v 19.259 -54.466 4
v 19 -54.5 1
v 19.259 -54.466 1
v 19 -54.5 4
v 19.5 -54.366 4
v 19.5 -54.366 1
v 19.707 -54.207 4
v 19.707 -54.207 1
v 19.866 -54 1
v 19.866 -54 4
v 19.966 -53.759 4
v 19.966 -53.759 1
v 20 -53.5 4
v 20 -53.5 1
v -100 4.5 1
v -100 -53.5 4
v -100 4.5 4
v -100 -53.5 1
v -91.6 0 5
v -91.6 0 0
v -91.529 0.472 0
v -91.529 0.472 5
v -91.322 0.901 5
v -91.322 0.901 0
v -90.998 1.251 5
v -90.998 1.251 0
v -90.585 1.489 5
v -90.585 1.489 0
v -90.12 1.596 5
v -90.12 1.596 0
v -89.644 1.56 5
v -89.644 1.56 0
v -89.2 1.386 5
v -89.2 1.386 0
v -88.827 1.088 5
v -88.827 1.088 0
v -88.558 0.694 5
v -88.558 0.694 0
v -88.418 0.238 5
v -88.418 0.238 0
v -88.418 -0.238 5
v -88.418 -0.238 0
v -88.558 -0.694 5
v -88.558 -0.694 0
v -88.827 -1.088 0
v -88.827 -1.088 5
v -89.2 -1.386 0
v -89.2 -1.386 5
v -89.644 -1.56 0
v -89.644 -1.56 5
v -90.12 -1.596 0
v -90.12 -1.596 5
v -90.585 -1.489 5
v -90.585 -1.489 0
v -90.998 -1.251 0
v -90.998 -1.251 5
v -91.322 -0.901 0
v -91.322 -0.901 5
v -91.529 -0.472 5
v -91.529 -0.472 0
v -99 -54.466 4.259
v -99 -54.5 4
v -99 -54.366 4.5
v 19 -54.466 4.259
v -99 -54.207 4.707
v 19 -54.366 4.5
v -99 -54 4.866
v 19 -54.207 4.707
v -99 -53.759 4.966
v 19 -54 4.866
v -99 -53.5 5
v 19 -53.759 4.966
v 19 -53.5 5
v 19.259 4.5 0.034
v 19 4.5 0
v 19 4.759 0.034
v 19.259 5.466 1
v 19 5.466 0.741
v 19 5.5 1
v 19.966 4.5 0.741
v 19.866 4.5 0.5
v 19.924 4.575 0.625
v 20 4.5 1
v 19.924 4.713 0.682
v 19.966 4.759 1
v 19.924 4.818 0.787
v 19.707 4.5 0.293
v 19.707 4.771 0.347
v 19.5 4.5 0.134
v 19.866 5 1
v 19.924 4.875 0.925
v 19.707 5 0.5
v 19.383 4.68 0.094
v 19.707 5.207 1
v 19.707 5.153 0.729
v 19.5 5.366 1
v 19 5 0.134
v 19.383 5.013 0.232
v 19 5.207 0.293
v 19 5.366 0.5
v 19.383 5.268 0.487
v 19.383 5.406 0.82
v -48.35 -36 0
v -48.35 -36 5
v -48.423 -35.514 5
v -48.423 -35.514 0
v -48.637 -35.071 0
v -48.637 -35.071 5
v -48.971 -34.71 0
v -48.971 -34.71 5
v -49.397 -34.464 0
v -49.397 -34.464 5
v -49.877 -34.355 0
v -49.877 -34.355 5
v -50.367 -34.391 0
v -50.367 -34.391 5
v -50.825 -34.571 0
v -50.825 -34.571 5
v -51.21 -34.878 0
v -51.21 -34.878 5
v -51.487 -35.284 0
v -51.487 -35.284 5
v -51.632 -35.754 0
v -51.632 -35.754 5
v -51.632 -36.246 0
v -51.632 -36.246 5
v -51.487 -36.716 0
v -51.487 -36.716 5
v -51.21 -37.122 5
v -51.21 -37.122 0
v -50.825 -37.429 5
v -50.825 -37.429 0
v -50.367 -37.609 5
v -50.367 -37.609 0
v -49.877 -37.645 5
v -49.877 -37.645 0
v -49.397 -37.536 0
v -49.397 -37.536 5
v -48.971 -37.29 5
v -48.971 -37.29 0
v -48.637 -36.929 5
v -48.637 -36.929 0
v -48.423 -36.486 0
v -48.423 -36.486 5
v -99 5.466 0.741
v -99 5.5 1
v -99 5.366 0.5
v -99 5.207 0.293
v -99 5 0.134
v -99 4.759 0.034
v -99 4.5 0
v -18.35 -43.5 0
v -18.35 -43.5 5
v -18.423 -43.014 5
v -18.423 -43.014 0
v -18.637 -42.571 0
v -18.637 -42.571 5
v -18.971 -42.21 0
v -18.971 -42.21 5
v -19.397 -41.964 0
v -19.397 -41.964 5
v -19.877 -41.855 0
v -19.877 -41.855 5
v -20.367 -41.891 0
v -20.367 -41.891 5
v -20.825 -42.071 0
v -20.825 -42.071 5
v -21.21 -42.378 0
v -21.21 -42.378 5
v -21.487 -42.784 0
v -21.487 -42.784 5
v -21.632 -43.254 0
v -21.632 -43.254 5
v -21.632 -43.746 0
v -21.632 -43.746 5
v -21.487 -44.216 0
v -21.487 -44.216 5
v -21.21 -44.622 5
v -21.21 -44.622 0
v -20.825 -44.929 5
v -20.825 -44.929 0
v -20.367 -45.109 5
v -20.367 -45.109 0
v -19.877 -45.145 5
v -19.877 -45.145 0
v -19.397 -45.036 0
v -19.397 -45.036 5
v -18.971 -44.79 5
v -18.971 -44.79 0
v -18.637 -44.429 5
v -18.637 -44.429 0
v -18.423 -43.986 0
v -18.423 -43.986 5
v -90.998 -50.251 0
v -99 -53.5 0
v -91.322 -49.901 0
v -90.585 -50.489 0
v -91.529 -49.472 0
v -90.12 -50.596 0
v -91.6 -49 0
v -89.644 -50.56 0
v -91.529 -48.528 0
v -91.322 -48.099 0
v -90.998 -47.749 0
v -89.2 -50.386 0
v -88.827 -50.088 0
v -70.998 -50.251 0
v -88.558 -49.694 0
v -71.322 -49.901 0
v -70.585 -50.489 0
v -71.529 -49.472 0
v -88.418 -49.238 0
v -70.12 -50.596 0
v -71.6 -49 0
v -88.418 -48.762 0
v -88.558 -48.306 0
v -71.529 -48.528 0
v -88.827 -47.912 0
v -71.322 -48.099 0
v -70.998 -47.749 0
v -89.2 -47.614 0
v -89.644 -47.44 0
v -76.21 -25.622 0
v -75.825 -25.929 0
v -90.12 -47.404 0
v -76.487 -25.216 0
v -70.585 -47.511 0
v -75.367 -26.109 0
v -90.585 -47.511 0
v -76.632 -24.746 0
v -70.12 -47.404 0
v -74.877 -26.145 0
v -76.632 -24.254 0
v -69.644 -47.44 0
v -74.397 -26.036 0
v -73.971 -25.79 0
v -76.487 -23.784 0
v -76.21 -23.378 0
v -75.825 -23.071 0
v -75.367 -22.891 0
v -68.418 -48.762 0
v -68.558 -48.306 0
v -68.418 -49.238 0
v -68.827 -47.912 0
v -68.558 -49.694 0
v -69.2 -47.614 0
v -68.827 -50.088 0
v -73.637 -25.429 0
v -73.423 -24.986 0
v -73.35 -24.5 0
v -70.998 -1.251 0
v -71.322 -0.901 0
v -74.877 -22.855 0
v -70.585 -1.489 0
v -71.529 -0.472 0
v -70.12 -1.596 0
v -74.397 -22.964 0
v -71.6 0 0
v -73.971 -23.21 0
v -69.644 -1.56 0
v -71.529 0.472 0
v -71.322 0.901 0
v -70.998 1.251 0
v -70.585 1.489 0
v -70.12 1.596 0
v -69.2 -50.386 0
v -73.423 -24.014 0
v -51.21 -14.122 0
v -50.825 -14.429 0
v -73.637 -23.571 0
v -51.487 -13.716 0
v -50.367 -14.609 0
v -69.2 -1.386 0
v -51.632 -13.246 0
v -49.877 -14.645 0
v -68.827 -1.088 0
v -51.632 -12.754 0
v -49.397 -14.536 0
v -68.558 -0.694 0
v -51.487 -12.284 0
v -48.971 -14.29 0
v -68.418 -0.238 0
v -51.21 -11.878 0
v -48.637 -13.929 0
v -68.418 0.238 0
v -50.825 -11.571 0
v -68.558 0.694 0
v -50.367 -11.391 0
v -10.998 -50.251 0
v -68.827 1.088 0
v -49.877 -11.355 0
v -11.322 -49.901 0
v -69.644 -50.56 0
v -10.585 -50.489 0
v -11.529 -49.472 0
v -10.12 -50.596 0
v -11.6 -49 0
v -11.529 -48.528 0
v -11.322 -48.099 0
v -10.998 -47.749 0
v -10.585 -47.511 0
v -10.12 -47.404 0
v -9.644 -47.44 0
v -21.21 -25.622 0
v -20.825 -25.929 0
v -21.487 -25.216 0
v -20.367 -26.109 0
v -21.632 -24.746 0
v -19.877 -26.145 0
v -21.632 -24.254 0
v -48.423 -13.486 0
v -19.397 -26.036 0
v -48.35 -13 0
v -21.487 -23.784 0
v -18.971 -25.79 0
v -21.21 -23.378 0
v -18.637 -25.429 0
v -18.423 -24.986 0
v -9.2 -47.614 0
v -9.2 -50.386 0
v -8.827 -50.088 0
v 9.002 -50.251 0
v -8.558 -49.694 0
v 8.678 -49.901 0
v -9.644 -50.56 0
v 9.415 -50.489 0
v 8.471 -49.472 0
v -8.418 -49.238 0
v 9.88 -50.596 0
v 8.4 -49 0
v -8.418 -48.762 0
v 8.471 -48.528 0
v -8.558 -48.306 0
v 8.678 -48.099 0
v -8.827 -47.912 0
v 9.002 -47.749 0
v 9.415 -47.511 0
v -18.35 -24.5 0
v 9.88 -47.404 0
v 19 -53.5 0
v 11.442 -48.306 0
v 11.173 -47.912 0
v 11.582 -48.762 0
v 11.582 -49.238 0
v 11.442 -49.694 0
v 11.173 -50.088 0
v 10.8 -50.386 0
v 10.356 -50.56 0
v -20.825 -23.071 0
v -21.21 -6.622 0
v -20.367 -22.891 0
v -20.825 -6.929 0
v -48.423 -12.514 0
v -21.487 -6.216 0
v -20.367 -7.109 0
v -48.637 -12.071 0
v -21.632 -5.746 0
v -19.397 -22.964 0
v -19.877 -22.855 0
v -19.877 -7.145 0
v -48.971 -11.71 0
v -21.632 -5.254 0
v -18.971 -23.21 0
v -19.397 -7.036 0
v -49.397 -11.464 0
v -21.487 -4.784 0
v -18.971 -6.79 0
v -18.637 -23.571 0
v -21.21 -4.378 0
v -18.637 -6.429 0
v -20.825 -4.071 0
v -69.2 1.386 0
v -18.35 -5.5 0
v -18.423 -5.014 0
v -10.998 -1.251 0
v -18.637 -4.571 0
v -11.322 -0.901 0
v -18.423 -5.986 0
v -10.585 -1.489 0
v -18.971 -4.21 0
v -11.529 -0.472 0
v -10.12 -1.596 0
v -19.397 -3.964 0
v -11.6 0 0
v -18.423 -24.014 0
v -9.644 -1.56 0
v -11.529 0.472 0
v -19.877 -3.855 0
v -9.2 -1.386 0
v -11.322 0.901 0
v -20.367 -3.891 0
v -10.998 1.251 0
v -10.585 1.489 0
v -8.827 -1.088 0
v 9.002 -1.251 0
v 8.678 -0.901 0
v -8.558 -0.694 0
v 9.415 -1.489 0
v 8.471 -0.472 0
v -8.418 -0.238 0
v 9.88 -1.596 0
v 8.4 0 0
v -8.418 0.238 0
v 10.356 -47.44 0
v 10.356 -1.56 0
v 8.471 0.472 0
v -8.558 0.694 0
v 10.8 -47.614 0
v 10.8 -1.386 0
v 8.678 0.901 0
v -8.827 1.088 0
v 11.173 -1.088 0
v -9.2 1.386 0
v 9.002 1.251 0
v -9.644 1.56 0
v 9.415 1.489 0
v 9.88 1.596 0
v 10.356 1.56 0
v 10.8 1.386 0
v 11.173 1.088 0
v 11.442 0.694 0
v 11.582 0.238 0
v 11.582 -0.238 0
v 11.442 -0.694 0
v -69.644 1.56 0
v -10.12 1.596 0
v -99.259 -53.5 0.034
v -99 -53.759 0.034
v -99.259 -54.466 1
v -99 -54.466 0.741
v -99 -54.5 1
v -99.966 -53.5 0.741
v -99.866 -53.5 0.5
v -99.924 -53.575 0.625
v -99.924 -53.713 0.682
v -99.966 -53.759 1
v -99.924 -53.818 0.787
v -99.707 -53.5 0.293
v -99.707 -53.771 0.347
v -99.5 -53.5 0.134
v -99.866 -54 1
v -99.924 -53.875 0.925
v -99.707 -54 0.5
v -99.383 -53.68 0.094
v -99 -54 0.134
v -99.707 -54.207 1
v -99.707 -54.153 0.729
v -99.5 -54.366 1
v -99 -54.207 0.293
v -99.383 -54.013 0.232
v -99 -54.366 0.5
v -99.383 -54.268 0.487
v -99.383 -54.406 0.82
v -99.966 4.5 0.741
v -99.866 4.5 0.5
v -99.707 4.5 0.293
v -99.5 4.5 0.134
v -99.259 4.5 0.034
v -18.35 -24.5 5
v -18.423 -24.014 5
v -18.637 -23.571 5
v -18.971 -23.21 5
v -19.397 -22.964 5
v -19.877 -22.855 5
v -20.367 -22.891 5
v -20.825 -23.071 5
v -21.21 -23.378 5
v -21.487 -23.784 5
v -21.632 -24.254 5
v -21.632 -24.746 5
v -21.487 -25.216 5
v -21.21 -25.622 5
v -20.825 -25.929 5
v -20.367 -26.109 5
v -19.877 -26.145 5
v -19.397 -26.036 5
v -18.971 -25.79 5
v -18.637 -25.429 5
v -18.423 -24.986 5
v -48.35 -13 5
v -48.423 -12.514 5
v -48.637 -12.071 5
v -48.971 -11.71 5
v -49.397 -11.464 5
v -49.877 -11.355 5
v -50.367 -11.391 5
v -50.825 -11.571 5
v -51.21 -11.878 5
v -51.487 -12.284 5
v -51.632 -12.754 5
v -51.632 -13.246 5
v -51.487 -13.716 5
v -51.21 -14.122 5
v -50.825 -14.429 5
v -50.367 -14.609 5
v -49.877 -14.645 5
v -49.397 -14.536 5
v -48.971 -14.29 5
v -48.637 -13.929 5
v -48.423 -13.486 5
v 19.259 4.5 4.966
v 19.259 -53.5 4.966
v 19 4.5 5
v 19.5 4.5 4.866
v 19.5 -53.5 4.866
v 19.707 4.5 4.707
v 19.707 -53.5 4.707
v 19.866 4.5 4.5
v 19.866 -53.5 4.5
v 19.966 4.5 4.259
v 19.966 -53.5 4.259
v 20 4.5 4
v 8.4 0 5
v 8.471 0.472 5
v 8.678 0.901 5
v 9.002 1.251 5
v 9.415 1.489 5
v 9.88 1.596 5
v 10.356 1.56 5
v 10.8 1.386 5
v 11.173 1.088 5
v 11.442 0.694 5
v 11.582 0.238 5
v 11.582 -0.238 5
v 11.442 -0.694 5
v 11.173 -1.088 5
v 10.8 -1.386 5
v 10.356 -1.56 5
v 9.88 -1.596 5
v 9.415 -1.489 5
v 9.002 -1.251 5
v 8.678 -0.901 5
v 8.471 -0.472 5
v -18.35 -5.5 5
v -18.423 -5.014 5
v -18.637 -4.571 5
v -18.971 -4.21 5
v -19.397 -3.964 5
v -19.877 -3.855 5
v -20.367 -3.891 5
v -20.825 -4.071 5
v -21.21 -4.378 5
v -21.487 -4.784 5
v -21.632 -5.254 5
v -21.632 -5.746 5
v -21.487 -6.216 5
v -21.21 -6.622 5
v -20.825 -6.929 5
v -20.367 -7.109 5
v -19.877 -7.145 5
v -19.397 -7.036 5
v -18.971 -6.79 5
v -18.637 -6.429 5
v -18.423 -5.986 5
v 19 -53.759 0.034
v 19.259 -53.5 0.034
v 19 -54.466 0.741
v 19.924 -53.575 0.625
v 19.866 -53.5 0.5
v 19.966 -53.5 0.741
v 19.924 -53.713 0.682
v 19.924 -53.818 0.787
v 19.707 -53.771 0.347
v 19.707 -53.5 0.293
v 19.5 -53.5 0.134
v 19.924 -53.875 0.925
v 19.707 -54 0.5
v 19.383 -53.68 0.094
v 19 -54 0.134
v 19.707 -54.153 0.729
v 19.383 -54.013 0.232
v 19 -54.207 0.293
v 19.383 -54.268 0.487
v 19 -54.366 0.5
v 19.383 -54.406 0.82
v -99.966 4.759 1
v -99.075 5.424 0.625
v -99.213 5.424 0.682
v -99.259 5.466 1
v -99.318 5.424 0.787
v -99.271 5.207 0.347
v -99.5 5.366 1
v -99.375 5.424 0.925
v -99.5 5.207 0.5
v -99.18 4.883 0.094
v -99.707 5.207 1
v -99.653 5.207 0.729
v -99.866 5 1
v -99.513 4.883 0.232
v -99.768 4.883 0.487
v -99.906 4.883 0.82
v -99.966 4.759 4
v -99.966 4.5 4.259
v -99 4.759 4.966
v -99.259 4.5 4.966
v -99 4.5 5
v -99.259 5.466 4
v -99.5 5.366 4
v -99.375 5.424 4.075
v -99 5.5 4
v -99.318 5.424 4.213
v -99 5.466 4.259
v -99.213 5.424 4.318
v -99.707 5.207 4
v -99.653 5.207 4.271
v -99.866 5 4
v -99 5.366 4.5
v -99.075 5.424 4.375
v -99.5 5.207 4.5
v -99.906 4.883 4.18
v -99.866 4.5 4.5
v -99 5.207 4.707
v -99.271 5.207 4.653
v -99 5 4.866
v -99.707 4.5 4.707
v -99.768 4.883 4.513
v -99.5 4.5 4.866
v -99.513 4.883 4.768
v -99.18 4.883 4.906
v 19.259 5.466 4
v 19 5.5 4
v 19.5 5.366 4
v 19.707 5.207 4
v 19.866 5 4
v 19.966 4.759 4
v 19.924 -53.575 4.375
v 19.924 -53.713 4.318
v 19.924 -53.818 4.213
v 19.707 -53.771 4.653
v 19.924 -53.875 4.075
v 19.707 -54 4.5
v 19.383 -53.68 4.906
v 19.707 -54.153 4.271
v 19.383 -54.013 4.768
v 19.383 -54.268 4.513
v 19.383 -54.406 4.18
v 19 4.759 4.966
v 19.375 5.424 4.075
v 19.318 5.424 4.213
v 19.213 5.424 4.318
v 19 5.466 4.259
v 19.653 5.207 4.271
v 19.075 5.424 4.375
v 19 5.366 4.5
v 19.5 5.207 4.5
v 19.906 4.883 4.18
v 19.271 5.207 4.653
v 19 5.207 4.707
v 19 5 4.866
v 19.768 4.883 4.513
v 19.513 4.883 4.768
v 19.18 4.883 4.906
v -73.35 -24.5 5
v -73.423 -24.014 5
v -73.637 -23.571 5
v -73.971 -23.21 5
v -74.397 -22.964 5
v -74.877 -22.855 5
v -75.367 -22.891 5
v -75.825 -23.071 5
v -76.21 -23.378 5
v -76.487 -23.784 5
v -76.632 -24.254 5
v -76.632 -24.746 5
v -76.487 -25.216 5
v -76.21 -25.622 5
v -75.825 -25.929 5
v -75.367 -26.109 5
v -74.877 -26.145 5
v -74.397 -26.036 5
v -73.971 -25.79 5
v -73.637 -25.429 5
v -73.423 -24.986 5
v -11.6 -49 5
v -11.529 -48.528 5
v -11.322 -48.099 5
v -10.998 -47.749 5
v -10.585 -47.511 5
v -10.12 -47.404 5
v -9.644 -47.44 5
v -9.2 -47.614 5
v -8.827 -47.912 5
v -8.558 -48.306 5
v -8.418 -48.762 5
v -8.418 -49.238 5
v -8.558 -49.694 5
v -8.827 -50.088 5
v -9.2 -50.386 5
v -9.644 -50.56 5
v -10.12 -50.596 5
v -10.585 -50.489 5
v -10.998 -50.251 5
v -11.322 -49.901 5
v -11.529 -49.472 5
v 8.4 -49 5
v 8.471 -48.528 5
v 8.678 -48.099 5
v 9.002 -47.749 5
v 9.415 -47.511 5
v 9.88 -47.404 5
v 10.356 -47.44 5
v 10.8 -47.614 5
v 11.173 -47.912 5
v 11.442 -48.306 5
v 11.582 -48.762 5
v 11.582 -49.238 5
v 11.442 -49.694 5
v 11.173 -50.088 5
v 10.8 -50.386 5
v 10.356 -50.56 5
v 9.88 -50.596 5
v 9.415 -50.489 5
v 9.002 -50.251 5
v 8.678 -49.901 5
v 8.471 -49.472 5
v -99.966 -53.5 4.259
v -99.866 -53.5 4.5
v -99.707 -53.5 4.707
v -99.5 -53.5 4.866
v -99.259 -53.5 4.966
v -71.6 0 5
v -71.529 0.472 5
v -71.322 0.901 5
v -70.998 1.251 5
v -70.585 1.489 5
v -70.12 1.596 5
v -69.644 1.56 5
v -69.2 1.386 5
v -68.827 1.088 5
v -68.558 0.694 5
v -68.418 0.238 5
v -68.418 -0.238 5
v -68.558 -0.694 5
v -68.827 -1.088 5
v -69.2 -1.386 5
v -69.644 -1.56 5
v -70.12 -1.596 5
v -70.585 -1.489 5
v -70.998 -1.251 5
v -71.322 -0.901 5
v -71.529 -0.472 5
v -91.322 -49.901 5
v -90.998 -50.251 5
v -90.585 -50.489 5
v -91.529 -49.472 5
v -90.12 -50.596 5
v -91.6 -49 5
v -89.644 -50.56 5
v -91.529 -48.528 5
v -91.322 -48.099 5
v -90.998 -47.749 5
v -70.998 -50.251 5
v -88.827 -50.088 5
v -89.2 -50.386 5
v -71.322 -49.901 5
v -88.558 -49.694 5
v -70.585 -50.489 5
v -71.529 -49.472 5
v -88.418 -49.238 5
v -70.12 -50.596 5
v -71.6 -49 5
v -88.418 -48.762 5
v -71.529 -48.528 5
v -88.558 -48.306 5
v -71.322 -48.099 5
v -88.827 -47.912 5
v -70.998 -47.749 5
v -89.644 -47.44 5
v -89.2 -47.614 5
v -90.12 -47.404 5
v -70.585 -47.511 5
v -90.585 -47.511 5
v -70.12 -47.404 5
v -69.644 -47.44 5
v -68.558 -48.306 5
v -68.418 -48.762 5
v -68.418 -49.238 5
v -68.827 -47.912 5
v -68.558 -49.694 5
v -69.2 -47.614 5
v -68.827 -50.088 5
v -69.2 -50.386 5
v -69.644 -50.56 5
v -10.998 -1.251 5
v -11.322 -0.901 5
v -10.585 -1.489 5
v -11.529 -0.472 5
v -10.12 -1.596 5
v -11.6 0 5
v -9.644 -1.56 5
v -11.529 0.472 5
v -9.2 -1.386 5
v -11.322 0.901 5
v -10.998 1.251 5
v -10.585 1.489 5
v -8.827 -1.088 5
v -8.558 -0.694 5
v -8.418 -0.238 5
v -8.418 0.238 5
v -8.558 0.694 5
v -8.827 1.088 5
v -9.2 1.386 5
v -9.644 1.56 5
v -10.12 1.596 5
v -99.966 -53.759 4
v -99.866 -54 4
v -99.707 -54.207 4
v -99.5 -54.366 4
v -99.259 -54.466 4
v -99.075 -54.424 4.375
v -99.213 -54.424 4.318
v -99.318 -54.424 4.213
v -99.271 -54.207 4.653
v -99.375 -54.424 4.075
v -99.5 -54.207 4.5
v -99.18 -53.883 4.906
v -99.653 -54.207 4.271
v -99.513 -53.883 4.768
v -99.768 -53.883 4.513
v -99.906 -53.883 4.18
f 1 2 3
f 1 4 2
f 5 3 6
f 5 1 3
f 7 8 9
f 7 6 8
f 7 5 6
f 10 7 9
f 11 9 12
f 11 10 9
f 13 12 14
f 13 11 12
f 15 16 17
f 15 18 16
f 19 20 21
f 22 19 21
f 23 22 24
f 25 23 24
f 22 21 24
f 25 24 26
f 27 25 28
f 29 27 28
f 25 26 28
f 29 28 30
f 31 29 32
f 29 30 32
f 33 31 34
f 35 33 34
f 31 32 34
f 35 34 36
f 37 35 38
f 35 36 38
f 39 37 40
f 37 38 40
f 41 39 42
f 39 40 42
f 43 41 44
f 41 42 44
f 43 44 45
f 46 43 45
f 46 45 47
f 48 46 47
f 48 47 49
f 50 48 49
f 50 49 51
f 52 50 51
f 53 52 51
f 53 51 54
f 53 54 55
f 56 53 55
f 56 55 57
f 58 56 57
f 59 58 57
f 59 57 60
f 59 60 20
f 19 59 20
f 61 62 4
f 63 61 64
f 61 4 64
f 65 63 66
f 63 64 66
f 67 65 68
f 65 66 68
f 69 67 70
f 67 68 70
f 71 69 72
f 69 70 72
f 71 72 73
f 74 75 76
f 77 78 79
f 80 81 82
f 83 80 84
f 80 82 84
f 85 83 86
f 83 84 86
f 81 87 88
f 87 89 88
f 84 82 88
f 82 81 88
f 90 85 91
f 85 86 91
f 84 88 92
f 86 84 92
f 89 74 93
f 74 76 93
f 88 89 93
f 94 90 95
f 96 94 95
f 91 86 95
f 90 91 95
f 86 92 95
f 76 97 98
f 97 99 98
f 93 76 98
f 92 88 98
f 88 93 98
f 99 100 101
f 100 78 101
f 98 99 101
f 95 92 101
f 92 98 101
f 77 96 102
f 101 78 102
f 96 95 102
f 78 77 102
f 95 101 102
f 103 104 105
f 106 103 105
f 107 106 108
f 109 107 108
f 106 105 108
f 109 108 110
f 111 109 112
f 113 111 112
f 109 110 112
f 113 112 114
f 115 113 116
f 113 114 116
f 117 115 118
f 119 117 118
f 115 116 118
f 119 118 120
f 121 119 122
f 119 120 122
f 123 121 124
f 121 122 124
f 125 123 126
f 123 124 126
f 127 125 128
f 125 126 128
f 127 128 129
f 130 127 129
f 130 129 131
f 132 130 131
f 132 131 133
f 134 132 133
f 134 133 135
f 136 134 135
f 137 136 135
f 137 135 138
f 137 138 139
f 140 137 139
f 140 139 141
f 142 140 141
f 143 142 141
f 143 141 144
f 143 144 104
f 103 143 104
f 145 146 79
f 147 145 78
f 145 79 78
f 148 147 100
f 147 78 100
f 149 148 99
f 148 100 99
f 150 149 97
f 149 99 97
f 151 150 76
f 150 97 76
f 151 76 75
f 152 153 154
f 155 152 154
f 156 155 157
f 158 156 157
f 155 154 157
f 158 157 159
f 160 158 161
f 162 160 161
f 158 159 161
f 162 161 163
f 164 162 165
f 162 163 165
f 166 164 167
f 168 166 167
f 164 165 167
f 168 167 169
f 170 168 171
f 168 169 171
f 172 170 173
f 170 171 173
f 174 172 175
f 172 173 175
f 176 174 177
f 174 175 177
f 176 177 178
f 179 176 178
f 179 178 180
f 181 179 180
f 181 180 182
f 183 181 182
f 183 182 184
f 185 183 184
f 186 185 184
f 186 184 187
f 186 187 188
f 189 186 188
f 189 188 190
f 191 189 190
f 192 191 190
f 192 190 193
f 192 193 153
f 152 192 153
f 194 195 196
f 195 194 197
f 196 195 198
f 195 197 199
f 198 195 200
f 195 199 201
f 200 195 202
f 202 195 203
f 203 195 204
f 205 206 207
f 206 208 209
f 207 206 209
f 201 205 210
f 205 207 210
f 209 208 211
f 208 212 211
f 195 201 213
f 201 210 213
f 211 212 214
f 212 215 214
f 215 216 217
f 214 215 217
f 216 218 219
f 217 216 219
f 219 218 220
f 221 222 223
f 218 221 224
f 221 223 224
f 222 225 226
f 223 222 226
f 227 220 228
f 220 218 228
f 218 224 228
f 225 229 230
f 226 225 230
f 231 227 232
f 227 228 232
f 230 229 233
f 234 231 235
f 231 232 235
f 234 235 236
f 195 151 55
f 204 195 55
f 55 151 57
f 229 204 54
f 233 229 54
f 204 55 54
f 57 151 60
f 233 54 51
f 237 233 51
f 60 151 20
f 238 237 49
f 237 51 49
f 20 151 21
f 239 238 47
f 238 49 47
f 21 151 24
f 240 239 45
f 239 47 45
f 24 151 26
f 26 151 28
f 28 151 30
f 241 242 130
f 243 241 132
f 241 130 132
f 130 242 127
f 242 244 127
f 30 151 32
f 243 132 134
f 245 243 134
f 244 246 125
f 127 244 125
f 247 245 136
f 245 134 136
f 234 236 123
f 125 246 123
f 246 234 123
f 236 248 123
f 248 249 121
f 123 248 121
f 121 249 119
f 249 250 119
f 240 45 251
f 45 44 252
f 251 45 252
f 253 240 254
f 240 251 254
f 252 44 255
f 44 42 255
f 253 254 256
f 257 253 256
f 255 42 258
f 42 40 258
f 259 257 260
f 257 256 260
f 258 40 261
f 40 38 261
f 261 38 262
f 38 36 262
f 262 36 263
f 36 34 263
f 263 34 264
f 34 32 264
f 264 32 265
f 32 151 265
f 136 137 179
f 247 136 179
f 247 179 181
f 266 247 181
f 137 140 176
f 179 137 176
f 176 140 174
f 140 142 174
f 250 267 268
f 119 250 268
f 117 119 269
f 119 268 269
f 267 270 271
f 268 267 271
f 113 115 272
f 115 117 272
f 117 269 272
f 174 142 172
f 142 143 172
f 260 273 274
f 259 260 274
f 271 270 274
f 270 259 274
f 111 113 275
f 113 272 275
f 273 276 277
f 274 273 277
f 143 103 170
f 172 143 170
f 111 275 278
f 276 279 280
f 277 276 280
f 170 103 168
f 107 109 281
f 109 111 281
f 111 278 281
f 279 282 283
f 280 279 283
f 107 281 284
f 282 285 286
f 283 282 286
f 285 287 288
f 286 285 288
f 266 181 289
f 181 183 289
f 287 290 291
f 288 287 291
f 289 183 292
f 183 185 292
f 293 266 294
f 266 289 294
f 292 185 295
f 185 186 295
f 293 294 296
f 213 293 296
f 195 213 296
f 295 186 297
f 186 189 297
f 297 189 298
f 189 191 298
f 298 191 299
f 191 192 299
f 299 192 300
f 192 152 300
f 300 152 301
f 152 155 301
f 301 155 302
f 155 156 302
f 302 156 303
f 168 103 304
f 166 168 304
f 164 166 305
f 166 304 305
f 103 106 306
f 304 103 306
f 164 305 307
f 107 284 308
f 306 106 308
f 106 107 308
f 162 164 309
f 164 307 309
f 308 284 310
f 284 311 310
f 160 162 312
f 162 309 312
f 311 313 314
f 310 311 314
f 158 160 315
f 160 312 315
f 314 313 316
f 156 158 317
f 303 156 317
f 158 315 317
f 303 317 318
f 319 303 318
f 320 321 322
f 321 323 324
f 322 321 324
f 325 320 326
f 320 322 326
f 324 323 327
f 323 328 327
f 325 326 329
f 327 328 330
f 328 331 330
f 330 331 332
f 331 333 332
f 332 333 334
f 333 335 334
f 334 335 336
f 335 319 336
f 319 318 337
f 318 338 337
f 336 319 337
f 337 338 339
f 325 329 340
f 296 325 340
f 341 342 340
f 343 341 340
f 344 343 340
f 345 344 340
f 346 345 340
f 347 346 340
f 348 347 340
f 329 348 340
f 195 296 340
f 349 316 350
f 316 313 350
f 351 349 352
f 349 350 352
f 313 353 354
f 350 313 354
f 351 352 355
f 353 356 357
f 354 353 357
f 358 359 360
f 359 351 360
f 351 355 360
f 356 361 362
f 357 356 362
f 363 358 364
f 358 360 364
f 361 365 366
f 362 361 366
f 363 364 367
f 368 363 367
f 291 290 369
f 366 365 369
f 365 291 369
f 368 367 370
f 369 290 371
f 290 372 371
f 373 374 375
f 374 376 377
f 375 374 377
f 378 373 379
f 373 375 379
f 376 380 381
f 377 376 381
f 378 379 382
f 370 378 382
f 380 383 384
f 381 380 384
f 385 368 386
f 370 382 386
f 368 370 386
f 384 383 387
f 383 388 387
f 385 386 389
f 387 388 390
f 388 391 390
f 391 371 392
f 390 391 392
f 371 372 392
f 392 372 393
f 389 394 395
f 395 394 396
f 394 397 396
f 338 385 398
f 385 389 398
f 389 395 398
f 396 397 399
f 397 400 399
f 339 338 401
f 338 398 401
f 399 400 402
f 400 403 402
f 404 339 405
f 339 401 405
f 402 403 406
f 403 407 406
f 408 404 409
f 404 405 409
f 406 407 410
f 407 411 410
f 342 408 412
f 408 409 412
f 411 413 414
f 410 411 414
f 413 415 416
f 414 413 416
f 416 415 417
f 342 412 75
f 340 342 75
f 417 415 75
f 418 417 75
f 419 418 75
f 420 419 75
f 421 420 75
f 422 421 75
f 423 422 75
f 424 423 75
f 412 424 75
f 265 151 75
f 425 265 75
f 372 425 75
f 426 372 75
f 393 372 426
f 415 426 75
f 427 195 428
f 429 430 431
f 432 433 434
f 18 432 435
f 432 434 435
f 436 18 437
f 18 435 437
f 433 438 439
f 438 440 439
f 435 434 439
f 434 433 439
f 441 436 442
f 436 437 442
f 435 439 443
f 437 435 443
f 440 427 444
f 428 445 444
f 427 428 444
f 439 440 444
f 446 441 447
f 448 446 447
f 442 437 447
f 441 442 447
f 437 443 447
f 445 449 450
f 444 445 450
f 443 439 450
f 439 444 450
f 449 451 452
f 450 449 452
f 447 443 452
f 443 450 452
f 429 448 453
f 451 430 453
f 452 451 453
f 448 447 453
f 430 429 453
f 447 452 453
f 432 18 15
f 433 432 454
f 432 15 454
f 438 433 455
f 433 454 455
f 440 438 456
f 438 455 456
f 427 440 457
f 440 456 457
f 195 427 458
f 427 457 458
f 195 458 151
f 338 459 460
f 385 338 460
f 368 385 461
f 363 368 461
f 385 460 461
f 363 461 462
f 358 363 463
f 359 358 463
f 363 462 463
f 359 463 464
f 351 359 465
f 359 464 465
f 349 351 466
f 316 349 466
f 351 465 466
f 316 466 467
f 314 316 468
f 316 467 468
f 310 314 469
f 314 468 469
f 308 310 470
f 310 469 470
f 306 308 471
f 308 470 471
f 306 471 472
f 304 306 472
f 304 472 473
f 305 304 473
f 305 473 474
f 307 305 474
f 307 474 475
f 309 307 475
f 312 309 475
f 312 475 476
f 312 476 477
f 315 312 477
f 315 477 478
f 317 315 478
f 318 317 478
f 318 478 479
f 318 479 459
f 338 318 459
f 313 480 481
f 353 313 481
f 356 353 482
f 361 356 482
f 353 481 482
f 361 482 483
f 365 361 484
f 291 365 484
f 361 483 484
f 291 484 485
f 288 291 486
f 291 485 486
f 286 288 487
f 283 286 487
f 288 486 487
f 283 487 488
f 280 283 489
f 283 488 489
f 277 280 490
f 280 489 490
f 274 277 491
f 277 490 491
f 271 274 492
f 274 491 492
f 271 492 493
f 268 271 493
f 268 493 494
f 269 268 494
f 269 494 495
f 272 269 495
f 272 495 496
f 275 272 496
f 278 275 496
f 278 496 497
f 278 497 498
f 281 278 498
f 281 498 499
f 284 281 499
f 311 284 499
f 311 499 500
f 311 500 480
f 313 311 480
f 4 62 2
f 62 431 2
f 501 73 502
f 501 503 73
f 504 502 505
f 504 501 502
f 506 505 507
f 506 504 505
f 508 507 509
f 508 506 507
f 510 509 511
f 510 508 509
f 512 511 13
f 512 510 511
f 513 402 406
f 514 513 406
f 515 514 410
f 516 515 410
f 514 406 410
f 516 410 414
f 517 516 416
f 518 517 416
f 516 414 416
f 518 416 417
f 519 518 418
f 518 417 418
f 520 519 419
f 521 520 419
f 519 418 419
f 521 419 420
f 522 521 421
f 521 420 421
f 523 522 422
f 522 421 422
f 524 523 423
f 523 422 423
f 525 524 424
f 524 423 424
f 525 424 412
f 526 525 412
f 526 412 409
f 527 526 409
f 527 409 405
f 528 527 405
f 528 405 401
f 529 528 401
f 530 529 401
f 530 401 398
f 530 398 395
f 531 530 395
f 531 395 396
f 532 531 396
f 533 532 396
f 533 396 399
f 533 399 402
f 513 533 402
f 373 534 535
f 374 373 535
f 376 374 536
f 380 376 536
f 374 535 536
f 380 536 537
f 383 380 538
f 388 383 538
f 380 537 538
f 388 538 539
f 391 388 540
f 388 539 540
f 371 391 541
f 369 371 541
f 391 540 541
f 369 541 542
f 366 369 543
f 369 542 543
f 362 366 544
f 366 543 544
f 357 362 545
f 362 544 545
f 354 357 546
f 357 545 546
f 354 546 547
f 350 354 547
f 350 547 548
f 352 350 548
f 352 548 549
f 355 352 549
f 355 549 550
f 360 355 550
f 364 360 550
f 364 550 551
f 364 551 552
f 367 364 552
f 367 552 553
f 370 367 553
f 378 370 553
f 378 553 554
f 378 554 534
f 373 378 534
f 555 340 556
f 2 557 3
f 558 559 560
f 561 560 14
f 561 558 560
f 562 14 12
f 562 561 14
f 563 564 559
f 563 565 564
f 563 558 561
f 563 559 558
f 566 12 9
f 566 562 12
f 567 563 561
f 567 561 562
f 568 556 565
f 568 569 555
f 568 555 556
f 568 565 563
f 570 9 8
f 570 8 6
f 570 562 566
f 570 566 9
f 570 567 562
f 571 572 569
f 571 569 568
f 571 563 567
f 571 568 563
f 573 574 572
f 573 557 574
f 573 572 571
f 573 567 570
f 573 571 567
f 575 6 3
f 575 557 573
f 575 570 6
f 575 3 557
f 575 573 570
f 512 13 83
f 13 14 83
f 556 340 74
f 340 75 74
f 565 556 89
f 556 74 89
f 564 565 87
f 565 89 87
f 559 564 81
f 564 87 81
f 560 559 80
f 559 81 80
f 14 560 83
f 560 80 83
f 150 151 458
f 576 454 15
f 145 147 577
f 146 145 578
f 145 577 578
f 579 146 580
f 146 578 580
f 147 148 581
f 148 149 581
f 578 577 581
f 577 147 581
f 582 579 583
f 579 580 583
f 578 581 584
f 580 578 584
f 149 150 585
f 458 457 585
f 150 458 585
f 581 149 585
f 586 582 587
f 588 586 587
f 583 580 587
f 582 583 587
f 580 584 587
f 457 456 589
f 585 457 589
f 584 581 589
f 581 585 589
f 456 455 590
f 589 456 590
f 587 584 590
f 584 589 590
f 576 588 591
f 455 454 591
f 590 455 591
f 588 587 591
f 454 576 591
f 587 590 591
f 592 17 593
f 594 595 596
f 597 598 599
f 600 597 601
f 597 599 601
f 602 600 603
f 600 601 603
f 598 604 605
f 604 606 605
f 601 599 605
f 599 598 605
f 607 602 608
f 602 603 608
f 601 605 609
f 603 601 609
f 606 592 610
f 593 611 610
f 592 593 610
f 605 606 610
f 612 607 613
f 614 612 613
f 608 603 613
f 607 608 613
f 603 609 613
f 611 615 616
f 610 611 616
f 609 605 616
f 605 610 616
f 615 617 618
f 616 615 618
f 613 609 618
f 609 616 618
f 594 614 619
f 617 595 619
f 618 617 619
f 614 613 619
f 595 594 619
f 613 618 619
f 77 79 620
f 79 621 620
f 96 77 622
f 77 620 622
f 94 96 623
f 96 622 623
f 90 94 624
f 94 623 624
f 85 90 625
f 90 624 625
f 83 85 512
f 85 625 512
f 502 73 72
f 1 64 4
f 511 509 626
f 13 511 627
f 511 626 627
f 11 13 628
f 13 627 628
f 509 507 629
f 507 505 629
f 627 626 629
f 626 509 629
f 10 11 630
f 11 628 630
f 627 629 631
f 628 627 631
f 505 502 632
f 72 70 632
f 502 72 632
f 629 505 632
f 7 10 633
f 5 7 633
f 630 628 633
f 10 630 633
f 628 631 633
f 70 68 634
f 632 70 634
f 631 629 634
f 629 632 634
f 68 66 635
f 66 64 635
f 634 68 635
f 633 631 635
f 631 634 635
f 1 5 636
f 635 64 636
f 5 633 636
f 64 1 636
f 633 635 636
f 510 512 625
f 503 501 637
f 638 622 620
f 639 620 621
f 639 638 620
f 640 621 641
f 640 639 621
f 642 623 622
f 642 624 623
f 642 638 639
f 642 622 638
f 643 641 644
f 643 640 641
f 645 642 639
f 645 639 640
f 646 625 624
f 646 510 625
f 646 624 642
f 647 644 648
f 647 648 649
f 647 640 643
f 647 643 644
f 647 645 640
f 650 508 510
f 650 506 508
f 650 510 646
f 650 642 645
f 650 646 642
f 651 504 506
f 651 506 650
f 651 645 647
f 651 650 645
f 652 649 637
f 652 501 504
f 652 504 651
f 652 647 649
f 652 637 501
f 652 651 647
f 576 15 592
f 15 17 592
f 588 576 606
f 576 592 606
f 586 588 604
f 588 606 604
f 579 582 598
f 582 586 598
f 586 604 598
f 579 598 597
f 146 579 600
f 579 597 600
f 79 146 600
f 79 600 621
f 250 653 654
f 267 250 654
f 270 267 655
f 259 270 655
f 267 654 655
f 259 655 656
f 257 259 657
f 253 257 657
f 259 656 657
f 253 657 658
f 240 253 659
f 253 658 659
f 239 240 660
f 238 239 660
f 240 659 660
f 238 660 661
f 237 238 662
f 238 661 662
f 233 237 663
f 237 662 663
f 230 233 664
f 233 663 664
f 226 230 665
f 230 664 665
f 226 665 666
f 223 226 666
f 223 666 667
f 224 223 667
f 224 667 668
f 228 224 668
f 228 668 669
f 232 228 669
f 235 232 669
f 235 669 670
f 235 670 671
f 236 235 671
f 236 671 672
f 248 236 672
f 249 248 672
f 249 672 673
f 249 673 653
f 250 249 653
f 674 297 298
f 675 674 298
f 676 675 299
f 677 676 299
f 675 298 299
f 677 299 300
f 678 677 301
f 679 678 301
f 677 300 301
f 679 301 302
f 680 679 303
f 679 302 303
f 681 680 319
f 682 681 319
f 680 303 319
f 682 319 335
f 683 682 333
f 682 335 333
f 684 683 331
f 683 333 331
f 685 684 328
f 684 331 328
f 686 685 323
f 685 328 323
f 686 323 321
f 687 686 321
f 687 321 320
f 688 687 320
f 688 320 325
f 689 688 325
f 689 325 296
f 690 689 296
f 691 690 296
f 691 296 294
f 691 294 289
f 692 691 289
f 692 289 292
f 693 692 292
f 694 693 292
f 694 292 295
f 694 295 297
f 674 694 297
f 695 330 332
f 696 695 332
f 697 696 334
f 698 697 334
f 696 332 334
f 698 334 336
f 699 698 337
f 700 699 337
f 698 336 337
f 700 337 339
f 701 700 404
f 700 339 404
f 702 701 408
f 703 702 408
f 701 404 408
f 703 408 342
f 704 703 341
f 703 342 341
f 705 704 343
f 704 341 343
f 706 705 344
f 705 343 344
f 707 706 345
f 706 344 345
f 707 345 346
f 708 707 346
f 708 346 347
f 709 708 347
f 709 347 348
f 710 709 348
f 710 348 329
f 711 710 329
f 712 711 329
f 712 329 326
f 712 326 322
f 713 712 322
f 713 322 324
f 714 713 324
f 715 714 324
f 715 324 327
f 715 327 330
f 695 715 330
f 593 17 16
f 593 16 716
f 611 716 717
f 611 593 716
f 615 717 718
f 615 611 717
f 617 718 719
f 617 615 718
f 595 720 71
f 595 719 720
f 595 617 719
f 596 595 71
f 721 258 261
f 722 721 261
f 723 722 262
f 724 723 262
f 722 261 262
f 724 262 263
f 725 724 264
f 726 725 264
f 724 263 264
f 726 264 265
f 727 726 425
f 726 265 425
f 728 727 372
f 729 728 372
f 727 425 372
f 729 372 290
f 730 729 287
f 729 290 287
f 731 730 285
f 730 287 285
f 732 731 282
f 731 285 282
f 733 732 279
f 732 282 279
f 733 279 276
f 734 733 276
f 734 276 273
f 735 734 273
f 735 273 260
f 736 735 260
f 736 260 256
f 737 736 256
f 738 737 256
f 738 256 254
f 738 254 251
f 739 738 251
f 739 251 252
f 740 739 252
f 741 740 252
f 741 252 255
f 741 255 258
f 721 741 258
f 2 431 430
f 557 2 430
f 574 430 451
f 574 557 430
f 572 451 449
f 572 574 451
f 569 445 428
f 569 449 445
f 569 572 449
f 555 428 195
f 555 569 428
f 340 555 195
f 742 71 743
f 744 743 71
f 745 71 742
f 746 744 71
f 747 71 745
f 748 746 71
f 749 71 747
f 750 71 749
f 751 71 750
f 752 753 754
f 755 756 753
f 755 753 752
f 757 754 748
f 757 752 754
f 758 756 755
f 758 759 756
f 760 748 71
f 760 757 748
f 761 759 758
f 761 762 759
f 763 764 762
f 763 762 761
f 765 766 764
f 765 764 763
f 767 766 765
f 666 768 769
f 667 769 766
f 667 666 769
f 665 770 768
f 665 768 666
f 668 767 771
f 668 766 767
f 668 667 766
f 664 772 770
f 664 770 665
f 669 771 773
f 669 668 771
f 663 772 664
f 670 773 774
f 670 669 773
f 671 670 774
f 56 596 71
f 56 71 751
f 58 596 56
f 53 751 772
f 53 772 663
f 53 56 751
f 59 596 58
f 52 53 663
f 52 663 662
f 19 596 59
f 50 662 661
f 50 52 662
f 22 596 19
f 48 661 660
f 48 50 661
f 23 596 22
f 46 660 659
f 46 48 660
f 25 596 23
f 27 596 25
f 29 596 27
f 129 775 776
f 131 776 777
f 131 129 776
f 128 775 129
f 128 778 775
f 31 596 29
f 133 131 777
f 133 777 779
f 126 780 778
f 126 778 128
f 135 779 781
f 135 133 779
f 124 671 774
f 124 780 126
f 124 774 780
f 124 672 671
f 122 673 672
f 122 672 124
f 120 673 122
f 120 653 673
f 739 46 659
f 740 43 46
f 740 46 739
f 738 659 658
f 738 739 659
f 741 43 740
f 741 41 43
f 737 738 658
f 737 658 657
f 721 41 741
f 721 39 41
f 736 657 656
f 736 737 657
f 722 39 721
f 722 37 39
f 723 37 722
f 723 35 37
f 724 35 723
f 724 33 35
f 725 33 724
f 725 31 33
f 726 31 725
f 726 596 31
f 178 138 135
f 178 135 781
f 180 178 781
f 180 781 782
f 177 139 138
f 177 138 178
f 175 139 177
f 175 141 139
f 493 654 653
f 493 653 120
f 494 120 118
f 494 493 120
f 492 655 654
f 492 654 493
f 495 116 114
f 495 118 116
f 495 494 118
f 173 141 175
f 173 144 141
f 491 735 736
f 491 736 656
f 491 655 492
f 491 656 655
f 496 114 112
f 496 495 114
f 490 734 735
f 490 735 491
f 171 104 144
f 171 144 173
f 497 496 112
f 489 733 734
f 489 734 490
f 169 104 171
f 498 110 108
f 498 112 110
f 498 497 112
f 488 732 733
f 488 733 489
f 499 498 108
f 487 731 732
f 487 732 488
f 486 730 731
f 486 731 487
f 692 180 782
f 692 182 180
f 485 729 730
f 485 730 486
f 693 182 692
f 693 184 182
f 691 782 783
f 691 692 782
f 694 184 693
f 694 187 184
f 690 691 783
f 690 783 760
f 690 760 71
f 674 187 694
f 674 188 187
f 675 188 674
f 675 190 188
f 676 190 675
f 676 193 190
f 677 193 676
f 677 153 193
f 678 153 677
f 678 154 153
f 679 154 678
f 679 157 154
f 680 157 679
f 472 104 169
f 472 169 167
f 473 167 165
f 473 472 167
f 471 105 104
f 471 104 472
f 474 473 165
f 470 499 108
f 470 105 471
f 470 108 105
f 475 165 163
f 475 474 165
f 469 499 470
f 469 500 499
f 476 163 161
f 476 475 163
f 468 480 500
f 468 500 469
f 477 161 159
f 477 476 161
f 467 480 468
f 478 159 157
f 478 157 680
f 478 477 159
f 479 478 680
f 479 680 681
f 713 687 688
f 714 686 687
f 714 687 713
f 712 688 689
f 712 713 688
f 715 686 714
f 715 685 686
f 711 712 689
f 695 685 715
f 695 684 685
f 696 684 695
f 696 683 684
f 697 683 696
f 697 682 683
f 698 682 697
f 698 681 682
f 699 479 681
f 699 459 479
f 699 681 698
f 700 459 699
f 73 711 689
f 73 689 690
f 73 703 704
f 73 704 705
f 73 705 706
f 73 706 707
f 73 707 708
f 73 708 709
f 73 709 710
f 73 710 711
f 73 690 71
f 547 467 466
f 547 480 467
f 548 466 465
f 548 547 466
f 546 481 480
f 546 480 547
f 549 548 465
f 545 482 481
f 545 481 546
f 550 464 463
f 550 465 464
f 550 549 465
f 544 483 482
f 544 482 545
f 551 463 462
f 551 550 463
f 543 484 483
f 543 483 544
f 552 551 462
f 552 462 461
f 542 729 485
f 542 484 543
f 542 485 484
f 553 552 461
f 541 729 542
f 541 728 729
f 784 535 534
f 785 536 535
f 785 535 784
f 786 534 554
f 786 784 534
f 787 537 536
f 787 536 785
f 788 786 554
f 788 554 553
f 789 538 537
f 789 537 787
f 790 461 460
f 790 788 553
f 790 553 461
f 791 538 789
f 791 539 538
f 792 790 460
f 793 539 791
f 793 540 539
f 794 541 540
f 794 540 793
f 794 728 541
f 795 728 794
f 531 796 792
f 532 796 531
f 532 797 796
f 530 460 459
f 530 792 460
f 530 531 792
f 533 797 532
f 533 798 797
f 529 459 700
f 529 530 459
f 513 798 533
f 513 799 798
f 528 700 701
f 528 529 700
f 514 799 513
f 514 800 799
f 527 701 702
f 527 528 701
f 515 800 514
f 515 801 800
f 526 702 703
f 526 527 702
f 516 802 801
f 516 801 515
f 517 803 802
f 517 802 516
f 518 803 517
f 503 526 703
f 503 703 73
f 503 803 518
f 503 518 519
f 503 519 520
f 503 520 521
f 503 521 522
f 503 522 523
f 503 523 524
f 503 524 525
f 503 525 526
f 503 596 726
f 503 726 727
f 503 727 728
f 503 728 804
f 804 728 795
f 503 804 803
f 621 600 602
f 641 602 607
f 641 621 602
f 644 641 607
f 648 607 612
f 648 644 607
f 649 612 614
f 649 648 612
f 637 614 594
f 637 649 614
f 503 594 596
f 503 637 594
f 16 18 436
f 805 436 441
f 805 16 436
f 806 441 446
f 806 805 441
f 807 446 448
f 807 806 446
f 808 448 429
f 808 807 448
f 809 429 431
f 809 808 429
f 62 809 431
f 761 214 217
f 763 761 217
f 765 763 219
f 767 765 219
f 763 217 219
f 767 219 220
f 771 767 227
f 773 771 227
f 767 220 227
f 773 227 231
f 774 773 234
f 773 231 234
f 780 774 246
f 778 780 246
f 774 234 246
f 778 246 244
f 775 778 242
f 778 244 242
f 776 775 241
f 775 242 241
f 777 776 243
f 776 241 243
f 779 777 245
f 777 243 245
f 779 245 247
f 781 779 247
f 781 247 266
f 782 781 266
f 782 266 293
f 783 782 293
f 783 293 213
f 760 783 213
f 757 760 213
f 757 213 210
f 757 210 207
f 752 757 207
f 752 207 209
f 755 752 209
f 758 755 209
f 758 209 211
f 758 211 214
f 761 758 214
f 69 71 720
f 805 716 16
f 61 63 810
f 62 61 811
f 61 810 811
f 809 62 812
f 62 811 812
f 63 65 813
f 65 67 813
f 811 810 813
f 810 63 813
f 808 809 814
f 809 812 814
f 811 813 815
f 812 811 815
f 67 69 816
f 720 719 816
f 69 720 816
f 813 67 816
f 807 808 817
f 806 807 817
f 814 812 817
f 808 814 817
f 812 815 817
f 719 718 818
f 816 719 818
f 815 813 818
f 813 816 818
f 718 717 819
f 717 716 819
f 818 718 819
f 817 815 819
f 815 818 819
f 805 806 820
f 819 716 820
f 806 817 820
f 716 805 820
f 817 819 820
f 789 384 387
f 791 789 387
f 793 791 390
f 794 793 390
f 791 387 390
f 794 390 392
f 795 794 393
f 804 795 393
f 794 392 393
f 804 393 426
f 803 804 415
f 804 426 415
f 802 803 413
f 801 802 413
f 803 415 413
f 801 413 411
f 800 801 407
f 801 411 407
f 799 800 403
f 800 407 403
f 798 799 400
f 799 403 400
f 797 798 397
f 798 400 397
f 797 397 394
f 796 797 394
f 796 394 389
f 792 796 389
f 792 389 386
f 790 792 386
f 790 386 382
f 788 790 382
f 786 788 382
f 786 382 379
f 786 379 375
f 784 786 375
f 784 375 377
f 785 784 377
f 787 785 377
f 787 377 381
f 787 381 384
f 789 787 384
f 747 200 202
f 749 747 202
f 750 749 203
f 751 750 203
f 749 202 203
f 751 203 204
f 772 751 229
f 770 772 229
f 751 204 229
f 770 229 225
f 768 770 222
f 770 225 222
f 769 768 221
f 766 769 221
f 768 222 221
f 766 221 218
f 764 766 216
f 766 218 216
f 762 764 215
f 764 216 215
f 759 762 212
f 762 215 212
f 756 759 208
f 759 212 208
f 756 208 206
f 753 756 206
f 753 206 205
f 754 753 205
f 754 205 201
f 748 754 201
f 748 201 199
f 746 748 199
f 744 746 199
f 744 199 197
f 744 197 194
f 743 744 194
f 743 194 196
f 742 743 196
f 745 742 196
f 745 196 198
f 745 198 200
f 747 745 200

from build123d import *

# Parameters (mm, degrees)
SKETCH_1_W          = 120
SKETCH_1_H          = 60
EXTRUDE_1_DEPTH     = 5
CUT_EXTRUDE_1_REACH = 115.997
SKETCH_2_R          = 1.65
CUT_EXTRUDE_2_REACH = 115.997
SKETCH_4_R          = 1.6
CUT_EXTRUDE_3_REACH = 115.997
SKETCH_5_R          = 1.65
FILLET_1_R          = 1


with BuildPart() as part:
    # 草图1 → 凸台-拉伸1 (new body)
    with BuildSketch(Plane.XY):
        with Locations((-40, -24.5)):
            Rectangle(SKETCH_1_W, SKETCH_1_H)
    extrude(amount=EXTRUDE_1_DEPTH)

    # 草图2 → 切除-拉伸1 (cut, up to next)
    with BuildSketch(Plane.XY.offset(5), mode=Mode.PRIVATE) as cut_extrude_1_sk1:
        with Locations((-50, -13)):
            Circle(SKETCH_2_R)
    cut_extrude_1_tool1 = extrude(cut_extrude_1_sk1.sketch, amount=-CUT_EXTRUDE_1_REACH, mode=Mode.PRIVATE) & part.part
    # 草图2 → 切除-拉伸1 (cut, up to next)
    with BuildSketch(Plane.XY.offset(5), mode=Mode.PRIVATE) as cut_extrude_1_sk2:
        with Locations((-75, -24.5)):
            Circle(SKETCH_2_R)
    cut_extrude_1_tool2 = extrude(cut_extrude_1_sk2.sketch, amount=-CUT_EXTRUDE_1_REACH, mode=Mode.PRIVATE) & part.part
    # 草图2 → 切除-拉伸1 (cut, up to next)
    with BuildSketch(Plane.XY.offset(5), mode=Mode.PRIVATE) as cut_extrude_1_sk3:
        with Locations((-50, -36)):
            Circle(SKETCH_2_R)
    cut_extrude_1_tool3 = extrude(cut_extrude_1_sk3.sketch, amount=-CUT_EXTRUDE_1_REACH, mode=Mode.PRIVATE) & part.part
    add(cut_extrude_1_tool1.solids().sort_by_distance((-50, -13, 5))[0], mode=Mode.SUBTRACT)
    add(cut_extrude_1_tool2.solids().sort_by_distance((-75, -24.5, 5))[0], mode=Mode.SUBTRACT)
    add(cut_extrude_1_tool3.solids().sort_by_distance((-50, -36, 5))[0], mode=Mode.SUBTRACT)

    # 草图4 → 切除-拉伸2 (cut, up to next)
    with BuildSketch(Plane(origin=(0, 0, 0), x_dir=(-1, 0, 0), z_dir=(0, 0, -1)), mode=Mode.PRIVATE) as cut_extrude_2_sk1:
        with Locations((90, 0)):
            Circle(SKETCH_4_R)
    cut_extrude_2_tool1 = extrude(cut_extrude_2_sk1.sketch, amount=-CUT_EXTRUDE_2_REACH, mode=Mode.PRIVATE) & part.part
    # 草图4 → 切除-拉伸2 (cut, up to next)
    with BuildSketch(Plane(origin=(0, 0, 0), x_dir=(-1, 0, 0), z_dir=(0, 0, -1)), mode=Mode.PRIVATE) as cut_extrude_2_sk2:
        with Locations((70, 0)):
            Circle(SKETCH_4_R)
    cut_extrude_2_tool2 = extrude(cut_extrude_2_sk2.sketch, amount=-CUT_EXTRUDE_2_REACH, mode=Mode.PRIVATE) & part.part
    # 草图4 → 切除-拉伸2 (cut, up to next)
    with BuildSketch(Plane(origin=(0, 0, 0), x_dir=(-1, 0, 0), z_dir=(0, 0, -1)), mode=Mode.PRIVATE) as cut_extrude_2_sk3:
        with Locations((70, -49)):
            Circle(SKETCH_4_R)
    cut_extrude_2_tool3 = extrude(cut_extrude_2_sk3.sketch, amount=-CUT_EXTRUDE_2_REACH, mode=Mode.PRIVATE) & part.part
    # 草图4 → 切除-拉伸2 (cut, up to next)
    with BuildSketch(Plane(origin=(0, 0, 0), x_dir=(-1, 0, 0), z_dir=(0, 0, -1)), mode=Mode.PRIVATE) as cut_extrude_2_sk4:
        with Locations((90, -49)):
            Circle(SKETCH_4_R)
    cut_extrude_2_tool4 = extrude(cut_extrude_2_sk4.sketch, amount=-CUT_EXTRUDE_2_REACH, mode=Mode.PRIVATE) & part.part
    # 草图4 → 切除-拉伸2 (cut, up to next)
    with BuildSketch(Plane(origin=(0, 0, 0), x_dir=(-1, 0, 0), z_dir=(0, 0, -1)), mode=Mode.PRIVATE) as cut_extrude_2_sk5:
        with Locations((10, -49)):
            Circle(SKETCH_4_R)
    cut_extrude_2_tool5 = extrude(cut_extrude_2_sk5.sketch, amount=-CUT_EXTRUDE_2_REACH, mode=Mode.PRIVATE) & part.part
    # 草图4 → 切除-拉伸2 (cut, up to next)
    with BuildSketch(Plane(origin=(0, 0, 0), x_dir=(-1, 0, 0), z_dir=(0, 0, -1)), mode=Mode.PRIVATE) as cut_extrude_2_sk6:
        with Locations((-10, -49)):
            Circle(SKETCH_4_R)
    cut_extrude_2_tool6 = extrude(cut_extrude_2_sk6.sketch, amount=-CUT_EXTRUDE_2_REACH, mode=Mode.PRIVATE) & part.part
    # 草图4 → 切除-拉伸2 (cut, up to next)
    with BuildSketch(Plane(origin=(0, 0, 0), x_dir=(-1, 0, 0), z_dir=(0, 0, -1)), mode=Mode.PRIVATE) as cut_extrude_2_sk7:
        with Locations((-10, 0)):
            Circle(SKETCH_4_R)
    cut_extrude_2_tool7 = extrude(cut_extrude_2_sk7.sketch, amount=-CUT_EXTRUDE_2_REACH, mode=Mode.PRIVATE) & part.part
    # 草图4 → 切除-拉伸2 (cut, up to next)
    with BuildSketch(Plane(origin=(0, 0, 0), x_dir=(-1, 0, 0), z_dir=(0, 0, -1)), mode=Mode.PRIVATE) as cut_extrude_2_sk8:
        with Locations((10, 0)):
            Circle(SKETCH_4_R)
    cut_extrude_2_tool8 = extrude(cut_extrude_2_sk8.sketch, amount=-CUT_EXTRUDE_2_REACH, mode=Mode.PRIVATE) & part.part
    add(cut_extrude_2_tool1.solids().sort_by_distance((-90, 0, 0))[0], mode=Mode.SUBTRACT)
    add(cut_extrude_2_tool2.solids().sort_by_distance((-70, 0, 0))[0], mode=Mode.SUBTRACT)
    add(cut_extrude_2_tool3.solids().sort_by_distance((-70, -49, 0))[0], mode=Mode.SUBTRACT)
    add(cut_extrude_2_tool4.solids().sort_by_distance((-90, -49, 0))[0], mode=Mode.SUBTRACT)
    add(cut_extrude_2_tool5.solids().sort_by_distance((-10, -49, 0))[0], mode=Mode.SUBTRACT)
    add(cut_extrude_2_tool6.solids().sort_by_distance((10, -49, 0))[0], mode=Mode.SUBTRACT)
    add(cut_extrude_2_tool7.solids().sort_by_distance((10, 0, 0))[0], mode=Mode.SUBTRACT)
    add(cut_extrude_2_tool8.solids().sort_by_distance((-10, 0, 0))[0], mode=Mode.SUBTRACT)

    # 草图5 → 切除-拉伸3 (cut, up to next)
    with BuildSketch(Plane.XY.offset(5), mode=Mode.PRIVATE) as cut_extrude_3_sk1:
        with Locations((-20, -43.5)):
            Circle(SKETCH_5_R)
    cut_extrude_3_tool1 = extrude(cut_extrude_3_sk1.sketch, amount=-CUT_EXTRUDE_3_REACH, mode=Mode.PRIVATE) & part.part
    # 草图5 → 切除-拉伸3 (cut, up to next)
    with BuildSketch(Plane.XY.offset(5), mode=Mode.PRIVATE) as cut_extrude_3_sk2:
        with Locations((-20, -24.5)):
            Circle(SKETCH_5_R)
    cut_extrude_3_tool2 = extrude(cut_extrude_3_sk2.sketch, amount=-CUT_EXTRUDE_3_REACH, mode=Mode.PRIVATE) & part.part
    # 草图5 → 切除-拉伸3 (cut, up to next)
    with BuildSketch(Plane.XY.offset(5), mode=Mode.PRIVATE) as cut_extrude_3_sk3:
        with Locations((-20, -5.5)):
            Circle(SKETCH_5_R)
    cut_extrude_3_tool3 = extrude(cut_extrude_3_sk3.sketch, amount=-CUT_EXTRUDE_3_REACH, mode=Mode.PRIVATE) & part.part
    add(cut_extrude_3_tool1.solids().sort_by_distance((-20, -43.5, 5))[0], mode=Mode.SUBTRACT)
    add(cut_extrude_3_tool2.solids().sort_by_distance((-20, -24.5, 5))[0], mode=Mode.SUBTRACT)
    add(cut_extrude_3_tool3.solids().sort_by_distance((-20, -5.5, 5))[0], mode=Mode.SUBTRACT)

    # 圆角1
    fillet_1_edges = [part.edges().sort_by_distance(p)[0] for p in [
        (-100, -24.5, 5),
        (-40, -54.5, 5),
        (20, -24.5, 5),
        (-40, -54.5, 0),
        (-100, -24.5, 0),
        (-40, 5.5, 0),
        (20, -24.5, 0),
        (20, -54.5, 2.5),
        (-100, -54.5, 2.5),
        (-100, 5.5, 2.5),
        (20, 5.5, 2.5),
        (-40, 5.5, 5),
    ]]
    fillet(fillet_1_edges, radius=FILLET_1_R)


solid = part.part
